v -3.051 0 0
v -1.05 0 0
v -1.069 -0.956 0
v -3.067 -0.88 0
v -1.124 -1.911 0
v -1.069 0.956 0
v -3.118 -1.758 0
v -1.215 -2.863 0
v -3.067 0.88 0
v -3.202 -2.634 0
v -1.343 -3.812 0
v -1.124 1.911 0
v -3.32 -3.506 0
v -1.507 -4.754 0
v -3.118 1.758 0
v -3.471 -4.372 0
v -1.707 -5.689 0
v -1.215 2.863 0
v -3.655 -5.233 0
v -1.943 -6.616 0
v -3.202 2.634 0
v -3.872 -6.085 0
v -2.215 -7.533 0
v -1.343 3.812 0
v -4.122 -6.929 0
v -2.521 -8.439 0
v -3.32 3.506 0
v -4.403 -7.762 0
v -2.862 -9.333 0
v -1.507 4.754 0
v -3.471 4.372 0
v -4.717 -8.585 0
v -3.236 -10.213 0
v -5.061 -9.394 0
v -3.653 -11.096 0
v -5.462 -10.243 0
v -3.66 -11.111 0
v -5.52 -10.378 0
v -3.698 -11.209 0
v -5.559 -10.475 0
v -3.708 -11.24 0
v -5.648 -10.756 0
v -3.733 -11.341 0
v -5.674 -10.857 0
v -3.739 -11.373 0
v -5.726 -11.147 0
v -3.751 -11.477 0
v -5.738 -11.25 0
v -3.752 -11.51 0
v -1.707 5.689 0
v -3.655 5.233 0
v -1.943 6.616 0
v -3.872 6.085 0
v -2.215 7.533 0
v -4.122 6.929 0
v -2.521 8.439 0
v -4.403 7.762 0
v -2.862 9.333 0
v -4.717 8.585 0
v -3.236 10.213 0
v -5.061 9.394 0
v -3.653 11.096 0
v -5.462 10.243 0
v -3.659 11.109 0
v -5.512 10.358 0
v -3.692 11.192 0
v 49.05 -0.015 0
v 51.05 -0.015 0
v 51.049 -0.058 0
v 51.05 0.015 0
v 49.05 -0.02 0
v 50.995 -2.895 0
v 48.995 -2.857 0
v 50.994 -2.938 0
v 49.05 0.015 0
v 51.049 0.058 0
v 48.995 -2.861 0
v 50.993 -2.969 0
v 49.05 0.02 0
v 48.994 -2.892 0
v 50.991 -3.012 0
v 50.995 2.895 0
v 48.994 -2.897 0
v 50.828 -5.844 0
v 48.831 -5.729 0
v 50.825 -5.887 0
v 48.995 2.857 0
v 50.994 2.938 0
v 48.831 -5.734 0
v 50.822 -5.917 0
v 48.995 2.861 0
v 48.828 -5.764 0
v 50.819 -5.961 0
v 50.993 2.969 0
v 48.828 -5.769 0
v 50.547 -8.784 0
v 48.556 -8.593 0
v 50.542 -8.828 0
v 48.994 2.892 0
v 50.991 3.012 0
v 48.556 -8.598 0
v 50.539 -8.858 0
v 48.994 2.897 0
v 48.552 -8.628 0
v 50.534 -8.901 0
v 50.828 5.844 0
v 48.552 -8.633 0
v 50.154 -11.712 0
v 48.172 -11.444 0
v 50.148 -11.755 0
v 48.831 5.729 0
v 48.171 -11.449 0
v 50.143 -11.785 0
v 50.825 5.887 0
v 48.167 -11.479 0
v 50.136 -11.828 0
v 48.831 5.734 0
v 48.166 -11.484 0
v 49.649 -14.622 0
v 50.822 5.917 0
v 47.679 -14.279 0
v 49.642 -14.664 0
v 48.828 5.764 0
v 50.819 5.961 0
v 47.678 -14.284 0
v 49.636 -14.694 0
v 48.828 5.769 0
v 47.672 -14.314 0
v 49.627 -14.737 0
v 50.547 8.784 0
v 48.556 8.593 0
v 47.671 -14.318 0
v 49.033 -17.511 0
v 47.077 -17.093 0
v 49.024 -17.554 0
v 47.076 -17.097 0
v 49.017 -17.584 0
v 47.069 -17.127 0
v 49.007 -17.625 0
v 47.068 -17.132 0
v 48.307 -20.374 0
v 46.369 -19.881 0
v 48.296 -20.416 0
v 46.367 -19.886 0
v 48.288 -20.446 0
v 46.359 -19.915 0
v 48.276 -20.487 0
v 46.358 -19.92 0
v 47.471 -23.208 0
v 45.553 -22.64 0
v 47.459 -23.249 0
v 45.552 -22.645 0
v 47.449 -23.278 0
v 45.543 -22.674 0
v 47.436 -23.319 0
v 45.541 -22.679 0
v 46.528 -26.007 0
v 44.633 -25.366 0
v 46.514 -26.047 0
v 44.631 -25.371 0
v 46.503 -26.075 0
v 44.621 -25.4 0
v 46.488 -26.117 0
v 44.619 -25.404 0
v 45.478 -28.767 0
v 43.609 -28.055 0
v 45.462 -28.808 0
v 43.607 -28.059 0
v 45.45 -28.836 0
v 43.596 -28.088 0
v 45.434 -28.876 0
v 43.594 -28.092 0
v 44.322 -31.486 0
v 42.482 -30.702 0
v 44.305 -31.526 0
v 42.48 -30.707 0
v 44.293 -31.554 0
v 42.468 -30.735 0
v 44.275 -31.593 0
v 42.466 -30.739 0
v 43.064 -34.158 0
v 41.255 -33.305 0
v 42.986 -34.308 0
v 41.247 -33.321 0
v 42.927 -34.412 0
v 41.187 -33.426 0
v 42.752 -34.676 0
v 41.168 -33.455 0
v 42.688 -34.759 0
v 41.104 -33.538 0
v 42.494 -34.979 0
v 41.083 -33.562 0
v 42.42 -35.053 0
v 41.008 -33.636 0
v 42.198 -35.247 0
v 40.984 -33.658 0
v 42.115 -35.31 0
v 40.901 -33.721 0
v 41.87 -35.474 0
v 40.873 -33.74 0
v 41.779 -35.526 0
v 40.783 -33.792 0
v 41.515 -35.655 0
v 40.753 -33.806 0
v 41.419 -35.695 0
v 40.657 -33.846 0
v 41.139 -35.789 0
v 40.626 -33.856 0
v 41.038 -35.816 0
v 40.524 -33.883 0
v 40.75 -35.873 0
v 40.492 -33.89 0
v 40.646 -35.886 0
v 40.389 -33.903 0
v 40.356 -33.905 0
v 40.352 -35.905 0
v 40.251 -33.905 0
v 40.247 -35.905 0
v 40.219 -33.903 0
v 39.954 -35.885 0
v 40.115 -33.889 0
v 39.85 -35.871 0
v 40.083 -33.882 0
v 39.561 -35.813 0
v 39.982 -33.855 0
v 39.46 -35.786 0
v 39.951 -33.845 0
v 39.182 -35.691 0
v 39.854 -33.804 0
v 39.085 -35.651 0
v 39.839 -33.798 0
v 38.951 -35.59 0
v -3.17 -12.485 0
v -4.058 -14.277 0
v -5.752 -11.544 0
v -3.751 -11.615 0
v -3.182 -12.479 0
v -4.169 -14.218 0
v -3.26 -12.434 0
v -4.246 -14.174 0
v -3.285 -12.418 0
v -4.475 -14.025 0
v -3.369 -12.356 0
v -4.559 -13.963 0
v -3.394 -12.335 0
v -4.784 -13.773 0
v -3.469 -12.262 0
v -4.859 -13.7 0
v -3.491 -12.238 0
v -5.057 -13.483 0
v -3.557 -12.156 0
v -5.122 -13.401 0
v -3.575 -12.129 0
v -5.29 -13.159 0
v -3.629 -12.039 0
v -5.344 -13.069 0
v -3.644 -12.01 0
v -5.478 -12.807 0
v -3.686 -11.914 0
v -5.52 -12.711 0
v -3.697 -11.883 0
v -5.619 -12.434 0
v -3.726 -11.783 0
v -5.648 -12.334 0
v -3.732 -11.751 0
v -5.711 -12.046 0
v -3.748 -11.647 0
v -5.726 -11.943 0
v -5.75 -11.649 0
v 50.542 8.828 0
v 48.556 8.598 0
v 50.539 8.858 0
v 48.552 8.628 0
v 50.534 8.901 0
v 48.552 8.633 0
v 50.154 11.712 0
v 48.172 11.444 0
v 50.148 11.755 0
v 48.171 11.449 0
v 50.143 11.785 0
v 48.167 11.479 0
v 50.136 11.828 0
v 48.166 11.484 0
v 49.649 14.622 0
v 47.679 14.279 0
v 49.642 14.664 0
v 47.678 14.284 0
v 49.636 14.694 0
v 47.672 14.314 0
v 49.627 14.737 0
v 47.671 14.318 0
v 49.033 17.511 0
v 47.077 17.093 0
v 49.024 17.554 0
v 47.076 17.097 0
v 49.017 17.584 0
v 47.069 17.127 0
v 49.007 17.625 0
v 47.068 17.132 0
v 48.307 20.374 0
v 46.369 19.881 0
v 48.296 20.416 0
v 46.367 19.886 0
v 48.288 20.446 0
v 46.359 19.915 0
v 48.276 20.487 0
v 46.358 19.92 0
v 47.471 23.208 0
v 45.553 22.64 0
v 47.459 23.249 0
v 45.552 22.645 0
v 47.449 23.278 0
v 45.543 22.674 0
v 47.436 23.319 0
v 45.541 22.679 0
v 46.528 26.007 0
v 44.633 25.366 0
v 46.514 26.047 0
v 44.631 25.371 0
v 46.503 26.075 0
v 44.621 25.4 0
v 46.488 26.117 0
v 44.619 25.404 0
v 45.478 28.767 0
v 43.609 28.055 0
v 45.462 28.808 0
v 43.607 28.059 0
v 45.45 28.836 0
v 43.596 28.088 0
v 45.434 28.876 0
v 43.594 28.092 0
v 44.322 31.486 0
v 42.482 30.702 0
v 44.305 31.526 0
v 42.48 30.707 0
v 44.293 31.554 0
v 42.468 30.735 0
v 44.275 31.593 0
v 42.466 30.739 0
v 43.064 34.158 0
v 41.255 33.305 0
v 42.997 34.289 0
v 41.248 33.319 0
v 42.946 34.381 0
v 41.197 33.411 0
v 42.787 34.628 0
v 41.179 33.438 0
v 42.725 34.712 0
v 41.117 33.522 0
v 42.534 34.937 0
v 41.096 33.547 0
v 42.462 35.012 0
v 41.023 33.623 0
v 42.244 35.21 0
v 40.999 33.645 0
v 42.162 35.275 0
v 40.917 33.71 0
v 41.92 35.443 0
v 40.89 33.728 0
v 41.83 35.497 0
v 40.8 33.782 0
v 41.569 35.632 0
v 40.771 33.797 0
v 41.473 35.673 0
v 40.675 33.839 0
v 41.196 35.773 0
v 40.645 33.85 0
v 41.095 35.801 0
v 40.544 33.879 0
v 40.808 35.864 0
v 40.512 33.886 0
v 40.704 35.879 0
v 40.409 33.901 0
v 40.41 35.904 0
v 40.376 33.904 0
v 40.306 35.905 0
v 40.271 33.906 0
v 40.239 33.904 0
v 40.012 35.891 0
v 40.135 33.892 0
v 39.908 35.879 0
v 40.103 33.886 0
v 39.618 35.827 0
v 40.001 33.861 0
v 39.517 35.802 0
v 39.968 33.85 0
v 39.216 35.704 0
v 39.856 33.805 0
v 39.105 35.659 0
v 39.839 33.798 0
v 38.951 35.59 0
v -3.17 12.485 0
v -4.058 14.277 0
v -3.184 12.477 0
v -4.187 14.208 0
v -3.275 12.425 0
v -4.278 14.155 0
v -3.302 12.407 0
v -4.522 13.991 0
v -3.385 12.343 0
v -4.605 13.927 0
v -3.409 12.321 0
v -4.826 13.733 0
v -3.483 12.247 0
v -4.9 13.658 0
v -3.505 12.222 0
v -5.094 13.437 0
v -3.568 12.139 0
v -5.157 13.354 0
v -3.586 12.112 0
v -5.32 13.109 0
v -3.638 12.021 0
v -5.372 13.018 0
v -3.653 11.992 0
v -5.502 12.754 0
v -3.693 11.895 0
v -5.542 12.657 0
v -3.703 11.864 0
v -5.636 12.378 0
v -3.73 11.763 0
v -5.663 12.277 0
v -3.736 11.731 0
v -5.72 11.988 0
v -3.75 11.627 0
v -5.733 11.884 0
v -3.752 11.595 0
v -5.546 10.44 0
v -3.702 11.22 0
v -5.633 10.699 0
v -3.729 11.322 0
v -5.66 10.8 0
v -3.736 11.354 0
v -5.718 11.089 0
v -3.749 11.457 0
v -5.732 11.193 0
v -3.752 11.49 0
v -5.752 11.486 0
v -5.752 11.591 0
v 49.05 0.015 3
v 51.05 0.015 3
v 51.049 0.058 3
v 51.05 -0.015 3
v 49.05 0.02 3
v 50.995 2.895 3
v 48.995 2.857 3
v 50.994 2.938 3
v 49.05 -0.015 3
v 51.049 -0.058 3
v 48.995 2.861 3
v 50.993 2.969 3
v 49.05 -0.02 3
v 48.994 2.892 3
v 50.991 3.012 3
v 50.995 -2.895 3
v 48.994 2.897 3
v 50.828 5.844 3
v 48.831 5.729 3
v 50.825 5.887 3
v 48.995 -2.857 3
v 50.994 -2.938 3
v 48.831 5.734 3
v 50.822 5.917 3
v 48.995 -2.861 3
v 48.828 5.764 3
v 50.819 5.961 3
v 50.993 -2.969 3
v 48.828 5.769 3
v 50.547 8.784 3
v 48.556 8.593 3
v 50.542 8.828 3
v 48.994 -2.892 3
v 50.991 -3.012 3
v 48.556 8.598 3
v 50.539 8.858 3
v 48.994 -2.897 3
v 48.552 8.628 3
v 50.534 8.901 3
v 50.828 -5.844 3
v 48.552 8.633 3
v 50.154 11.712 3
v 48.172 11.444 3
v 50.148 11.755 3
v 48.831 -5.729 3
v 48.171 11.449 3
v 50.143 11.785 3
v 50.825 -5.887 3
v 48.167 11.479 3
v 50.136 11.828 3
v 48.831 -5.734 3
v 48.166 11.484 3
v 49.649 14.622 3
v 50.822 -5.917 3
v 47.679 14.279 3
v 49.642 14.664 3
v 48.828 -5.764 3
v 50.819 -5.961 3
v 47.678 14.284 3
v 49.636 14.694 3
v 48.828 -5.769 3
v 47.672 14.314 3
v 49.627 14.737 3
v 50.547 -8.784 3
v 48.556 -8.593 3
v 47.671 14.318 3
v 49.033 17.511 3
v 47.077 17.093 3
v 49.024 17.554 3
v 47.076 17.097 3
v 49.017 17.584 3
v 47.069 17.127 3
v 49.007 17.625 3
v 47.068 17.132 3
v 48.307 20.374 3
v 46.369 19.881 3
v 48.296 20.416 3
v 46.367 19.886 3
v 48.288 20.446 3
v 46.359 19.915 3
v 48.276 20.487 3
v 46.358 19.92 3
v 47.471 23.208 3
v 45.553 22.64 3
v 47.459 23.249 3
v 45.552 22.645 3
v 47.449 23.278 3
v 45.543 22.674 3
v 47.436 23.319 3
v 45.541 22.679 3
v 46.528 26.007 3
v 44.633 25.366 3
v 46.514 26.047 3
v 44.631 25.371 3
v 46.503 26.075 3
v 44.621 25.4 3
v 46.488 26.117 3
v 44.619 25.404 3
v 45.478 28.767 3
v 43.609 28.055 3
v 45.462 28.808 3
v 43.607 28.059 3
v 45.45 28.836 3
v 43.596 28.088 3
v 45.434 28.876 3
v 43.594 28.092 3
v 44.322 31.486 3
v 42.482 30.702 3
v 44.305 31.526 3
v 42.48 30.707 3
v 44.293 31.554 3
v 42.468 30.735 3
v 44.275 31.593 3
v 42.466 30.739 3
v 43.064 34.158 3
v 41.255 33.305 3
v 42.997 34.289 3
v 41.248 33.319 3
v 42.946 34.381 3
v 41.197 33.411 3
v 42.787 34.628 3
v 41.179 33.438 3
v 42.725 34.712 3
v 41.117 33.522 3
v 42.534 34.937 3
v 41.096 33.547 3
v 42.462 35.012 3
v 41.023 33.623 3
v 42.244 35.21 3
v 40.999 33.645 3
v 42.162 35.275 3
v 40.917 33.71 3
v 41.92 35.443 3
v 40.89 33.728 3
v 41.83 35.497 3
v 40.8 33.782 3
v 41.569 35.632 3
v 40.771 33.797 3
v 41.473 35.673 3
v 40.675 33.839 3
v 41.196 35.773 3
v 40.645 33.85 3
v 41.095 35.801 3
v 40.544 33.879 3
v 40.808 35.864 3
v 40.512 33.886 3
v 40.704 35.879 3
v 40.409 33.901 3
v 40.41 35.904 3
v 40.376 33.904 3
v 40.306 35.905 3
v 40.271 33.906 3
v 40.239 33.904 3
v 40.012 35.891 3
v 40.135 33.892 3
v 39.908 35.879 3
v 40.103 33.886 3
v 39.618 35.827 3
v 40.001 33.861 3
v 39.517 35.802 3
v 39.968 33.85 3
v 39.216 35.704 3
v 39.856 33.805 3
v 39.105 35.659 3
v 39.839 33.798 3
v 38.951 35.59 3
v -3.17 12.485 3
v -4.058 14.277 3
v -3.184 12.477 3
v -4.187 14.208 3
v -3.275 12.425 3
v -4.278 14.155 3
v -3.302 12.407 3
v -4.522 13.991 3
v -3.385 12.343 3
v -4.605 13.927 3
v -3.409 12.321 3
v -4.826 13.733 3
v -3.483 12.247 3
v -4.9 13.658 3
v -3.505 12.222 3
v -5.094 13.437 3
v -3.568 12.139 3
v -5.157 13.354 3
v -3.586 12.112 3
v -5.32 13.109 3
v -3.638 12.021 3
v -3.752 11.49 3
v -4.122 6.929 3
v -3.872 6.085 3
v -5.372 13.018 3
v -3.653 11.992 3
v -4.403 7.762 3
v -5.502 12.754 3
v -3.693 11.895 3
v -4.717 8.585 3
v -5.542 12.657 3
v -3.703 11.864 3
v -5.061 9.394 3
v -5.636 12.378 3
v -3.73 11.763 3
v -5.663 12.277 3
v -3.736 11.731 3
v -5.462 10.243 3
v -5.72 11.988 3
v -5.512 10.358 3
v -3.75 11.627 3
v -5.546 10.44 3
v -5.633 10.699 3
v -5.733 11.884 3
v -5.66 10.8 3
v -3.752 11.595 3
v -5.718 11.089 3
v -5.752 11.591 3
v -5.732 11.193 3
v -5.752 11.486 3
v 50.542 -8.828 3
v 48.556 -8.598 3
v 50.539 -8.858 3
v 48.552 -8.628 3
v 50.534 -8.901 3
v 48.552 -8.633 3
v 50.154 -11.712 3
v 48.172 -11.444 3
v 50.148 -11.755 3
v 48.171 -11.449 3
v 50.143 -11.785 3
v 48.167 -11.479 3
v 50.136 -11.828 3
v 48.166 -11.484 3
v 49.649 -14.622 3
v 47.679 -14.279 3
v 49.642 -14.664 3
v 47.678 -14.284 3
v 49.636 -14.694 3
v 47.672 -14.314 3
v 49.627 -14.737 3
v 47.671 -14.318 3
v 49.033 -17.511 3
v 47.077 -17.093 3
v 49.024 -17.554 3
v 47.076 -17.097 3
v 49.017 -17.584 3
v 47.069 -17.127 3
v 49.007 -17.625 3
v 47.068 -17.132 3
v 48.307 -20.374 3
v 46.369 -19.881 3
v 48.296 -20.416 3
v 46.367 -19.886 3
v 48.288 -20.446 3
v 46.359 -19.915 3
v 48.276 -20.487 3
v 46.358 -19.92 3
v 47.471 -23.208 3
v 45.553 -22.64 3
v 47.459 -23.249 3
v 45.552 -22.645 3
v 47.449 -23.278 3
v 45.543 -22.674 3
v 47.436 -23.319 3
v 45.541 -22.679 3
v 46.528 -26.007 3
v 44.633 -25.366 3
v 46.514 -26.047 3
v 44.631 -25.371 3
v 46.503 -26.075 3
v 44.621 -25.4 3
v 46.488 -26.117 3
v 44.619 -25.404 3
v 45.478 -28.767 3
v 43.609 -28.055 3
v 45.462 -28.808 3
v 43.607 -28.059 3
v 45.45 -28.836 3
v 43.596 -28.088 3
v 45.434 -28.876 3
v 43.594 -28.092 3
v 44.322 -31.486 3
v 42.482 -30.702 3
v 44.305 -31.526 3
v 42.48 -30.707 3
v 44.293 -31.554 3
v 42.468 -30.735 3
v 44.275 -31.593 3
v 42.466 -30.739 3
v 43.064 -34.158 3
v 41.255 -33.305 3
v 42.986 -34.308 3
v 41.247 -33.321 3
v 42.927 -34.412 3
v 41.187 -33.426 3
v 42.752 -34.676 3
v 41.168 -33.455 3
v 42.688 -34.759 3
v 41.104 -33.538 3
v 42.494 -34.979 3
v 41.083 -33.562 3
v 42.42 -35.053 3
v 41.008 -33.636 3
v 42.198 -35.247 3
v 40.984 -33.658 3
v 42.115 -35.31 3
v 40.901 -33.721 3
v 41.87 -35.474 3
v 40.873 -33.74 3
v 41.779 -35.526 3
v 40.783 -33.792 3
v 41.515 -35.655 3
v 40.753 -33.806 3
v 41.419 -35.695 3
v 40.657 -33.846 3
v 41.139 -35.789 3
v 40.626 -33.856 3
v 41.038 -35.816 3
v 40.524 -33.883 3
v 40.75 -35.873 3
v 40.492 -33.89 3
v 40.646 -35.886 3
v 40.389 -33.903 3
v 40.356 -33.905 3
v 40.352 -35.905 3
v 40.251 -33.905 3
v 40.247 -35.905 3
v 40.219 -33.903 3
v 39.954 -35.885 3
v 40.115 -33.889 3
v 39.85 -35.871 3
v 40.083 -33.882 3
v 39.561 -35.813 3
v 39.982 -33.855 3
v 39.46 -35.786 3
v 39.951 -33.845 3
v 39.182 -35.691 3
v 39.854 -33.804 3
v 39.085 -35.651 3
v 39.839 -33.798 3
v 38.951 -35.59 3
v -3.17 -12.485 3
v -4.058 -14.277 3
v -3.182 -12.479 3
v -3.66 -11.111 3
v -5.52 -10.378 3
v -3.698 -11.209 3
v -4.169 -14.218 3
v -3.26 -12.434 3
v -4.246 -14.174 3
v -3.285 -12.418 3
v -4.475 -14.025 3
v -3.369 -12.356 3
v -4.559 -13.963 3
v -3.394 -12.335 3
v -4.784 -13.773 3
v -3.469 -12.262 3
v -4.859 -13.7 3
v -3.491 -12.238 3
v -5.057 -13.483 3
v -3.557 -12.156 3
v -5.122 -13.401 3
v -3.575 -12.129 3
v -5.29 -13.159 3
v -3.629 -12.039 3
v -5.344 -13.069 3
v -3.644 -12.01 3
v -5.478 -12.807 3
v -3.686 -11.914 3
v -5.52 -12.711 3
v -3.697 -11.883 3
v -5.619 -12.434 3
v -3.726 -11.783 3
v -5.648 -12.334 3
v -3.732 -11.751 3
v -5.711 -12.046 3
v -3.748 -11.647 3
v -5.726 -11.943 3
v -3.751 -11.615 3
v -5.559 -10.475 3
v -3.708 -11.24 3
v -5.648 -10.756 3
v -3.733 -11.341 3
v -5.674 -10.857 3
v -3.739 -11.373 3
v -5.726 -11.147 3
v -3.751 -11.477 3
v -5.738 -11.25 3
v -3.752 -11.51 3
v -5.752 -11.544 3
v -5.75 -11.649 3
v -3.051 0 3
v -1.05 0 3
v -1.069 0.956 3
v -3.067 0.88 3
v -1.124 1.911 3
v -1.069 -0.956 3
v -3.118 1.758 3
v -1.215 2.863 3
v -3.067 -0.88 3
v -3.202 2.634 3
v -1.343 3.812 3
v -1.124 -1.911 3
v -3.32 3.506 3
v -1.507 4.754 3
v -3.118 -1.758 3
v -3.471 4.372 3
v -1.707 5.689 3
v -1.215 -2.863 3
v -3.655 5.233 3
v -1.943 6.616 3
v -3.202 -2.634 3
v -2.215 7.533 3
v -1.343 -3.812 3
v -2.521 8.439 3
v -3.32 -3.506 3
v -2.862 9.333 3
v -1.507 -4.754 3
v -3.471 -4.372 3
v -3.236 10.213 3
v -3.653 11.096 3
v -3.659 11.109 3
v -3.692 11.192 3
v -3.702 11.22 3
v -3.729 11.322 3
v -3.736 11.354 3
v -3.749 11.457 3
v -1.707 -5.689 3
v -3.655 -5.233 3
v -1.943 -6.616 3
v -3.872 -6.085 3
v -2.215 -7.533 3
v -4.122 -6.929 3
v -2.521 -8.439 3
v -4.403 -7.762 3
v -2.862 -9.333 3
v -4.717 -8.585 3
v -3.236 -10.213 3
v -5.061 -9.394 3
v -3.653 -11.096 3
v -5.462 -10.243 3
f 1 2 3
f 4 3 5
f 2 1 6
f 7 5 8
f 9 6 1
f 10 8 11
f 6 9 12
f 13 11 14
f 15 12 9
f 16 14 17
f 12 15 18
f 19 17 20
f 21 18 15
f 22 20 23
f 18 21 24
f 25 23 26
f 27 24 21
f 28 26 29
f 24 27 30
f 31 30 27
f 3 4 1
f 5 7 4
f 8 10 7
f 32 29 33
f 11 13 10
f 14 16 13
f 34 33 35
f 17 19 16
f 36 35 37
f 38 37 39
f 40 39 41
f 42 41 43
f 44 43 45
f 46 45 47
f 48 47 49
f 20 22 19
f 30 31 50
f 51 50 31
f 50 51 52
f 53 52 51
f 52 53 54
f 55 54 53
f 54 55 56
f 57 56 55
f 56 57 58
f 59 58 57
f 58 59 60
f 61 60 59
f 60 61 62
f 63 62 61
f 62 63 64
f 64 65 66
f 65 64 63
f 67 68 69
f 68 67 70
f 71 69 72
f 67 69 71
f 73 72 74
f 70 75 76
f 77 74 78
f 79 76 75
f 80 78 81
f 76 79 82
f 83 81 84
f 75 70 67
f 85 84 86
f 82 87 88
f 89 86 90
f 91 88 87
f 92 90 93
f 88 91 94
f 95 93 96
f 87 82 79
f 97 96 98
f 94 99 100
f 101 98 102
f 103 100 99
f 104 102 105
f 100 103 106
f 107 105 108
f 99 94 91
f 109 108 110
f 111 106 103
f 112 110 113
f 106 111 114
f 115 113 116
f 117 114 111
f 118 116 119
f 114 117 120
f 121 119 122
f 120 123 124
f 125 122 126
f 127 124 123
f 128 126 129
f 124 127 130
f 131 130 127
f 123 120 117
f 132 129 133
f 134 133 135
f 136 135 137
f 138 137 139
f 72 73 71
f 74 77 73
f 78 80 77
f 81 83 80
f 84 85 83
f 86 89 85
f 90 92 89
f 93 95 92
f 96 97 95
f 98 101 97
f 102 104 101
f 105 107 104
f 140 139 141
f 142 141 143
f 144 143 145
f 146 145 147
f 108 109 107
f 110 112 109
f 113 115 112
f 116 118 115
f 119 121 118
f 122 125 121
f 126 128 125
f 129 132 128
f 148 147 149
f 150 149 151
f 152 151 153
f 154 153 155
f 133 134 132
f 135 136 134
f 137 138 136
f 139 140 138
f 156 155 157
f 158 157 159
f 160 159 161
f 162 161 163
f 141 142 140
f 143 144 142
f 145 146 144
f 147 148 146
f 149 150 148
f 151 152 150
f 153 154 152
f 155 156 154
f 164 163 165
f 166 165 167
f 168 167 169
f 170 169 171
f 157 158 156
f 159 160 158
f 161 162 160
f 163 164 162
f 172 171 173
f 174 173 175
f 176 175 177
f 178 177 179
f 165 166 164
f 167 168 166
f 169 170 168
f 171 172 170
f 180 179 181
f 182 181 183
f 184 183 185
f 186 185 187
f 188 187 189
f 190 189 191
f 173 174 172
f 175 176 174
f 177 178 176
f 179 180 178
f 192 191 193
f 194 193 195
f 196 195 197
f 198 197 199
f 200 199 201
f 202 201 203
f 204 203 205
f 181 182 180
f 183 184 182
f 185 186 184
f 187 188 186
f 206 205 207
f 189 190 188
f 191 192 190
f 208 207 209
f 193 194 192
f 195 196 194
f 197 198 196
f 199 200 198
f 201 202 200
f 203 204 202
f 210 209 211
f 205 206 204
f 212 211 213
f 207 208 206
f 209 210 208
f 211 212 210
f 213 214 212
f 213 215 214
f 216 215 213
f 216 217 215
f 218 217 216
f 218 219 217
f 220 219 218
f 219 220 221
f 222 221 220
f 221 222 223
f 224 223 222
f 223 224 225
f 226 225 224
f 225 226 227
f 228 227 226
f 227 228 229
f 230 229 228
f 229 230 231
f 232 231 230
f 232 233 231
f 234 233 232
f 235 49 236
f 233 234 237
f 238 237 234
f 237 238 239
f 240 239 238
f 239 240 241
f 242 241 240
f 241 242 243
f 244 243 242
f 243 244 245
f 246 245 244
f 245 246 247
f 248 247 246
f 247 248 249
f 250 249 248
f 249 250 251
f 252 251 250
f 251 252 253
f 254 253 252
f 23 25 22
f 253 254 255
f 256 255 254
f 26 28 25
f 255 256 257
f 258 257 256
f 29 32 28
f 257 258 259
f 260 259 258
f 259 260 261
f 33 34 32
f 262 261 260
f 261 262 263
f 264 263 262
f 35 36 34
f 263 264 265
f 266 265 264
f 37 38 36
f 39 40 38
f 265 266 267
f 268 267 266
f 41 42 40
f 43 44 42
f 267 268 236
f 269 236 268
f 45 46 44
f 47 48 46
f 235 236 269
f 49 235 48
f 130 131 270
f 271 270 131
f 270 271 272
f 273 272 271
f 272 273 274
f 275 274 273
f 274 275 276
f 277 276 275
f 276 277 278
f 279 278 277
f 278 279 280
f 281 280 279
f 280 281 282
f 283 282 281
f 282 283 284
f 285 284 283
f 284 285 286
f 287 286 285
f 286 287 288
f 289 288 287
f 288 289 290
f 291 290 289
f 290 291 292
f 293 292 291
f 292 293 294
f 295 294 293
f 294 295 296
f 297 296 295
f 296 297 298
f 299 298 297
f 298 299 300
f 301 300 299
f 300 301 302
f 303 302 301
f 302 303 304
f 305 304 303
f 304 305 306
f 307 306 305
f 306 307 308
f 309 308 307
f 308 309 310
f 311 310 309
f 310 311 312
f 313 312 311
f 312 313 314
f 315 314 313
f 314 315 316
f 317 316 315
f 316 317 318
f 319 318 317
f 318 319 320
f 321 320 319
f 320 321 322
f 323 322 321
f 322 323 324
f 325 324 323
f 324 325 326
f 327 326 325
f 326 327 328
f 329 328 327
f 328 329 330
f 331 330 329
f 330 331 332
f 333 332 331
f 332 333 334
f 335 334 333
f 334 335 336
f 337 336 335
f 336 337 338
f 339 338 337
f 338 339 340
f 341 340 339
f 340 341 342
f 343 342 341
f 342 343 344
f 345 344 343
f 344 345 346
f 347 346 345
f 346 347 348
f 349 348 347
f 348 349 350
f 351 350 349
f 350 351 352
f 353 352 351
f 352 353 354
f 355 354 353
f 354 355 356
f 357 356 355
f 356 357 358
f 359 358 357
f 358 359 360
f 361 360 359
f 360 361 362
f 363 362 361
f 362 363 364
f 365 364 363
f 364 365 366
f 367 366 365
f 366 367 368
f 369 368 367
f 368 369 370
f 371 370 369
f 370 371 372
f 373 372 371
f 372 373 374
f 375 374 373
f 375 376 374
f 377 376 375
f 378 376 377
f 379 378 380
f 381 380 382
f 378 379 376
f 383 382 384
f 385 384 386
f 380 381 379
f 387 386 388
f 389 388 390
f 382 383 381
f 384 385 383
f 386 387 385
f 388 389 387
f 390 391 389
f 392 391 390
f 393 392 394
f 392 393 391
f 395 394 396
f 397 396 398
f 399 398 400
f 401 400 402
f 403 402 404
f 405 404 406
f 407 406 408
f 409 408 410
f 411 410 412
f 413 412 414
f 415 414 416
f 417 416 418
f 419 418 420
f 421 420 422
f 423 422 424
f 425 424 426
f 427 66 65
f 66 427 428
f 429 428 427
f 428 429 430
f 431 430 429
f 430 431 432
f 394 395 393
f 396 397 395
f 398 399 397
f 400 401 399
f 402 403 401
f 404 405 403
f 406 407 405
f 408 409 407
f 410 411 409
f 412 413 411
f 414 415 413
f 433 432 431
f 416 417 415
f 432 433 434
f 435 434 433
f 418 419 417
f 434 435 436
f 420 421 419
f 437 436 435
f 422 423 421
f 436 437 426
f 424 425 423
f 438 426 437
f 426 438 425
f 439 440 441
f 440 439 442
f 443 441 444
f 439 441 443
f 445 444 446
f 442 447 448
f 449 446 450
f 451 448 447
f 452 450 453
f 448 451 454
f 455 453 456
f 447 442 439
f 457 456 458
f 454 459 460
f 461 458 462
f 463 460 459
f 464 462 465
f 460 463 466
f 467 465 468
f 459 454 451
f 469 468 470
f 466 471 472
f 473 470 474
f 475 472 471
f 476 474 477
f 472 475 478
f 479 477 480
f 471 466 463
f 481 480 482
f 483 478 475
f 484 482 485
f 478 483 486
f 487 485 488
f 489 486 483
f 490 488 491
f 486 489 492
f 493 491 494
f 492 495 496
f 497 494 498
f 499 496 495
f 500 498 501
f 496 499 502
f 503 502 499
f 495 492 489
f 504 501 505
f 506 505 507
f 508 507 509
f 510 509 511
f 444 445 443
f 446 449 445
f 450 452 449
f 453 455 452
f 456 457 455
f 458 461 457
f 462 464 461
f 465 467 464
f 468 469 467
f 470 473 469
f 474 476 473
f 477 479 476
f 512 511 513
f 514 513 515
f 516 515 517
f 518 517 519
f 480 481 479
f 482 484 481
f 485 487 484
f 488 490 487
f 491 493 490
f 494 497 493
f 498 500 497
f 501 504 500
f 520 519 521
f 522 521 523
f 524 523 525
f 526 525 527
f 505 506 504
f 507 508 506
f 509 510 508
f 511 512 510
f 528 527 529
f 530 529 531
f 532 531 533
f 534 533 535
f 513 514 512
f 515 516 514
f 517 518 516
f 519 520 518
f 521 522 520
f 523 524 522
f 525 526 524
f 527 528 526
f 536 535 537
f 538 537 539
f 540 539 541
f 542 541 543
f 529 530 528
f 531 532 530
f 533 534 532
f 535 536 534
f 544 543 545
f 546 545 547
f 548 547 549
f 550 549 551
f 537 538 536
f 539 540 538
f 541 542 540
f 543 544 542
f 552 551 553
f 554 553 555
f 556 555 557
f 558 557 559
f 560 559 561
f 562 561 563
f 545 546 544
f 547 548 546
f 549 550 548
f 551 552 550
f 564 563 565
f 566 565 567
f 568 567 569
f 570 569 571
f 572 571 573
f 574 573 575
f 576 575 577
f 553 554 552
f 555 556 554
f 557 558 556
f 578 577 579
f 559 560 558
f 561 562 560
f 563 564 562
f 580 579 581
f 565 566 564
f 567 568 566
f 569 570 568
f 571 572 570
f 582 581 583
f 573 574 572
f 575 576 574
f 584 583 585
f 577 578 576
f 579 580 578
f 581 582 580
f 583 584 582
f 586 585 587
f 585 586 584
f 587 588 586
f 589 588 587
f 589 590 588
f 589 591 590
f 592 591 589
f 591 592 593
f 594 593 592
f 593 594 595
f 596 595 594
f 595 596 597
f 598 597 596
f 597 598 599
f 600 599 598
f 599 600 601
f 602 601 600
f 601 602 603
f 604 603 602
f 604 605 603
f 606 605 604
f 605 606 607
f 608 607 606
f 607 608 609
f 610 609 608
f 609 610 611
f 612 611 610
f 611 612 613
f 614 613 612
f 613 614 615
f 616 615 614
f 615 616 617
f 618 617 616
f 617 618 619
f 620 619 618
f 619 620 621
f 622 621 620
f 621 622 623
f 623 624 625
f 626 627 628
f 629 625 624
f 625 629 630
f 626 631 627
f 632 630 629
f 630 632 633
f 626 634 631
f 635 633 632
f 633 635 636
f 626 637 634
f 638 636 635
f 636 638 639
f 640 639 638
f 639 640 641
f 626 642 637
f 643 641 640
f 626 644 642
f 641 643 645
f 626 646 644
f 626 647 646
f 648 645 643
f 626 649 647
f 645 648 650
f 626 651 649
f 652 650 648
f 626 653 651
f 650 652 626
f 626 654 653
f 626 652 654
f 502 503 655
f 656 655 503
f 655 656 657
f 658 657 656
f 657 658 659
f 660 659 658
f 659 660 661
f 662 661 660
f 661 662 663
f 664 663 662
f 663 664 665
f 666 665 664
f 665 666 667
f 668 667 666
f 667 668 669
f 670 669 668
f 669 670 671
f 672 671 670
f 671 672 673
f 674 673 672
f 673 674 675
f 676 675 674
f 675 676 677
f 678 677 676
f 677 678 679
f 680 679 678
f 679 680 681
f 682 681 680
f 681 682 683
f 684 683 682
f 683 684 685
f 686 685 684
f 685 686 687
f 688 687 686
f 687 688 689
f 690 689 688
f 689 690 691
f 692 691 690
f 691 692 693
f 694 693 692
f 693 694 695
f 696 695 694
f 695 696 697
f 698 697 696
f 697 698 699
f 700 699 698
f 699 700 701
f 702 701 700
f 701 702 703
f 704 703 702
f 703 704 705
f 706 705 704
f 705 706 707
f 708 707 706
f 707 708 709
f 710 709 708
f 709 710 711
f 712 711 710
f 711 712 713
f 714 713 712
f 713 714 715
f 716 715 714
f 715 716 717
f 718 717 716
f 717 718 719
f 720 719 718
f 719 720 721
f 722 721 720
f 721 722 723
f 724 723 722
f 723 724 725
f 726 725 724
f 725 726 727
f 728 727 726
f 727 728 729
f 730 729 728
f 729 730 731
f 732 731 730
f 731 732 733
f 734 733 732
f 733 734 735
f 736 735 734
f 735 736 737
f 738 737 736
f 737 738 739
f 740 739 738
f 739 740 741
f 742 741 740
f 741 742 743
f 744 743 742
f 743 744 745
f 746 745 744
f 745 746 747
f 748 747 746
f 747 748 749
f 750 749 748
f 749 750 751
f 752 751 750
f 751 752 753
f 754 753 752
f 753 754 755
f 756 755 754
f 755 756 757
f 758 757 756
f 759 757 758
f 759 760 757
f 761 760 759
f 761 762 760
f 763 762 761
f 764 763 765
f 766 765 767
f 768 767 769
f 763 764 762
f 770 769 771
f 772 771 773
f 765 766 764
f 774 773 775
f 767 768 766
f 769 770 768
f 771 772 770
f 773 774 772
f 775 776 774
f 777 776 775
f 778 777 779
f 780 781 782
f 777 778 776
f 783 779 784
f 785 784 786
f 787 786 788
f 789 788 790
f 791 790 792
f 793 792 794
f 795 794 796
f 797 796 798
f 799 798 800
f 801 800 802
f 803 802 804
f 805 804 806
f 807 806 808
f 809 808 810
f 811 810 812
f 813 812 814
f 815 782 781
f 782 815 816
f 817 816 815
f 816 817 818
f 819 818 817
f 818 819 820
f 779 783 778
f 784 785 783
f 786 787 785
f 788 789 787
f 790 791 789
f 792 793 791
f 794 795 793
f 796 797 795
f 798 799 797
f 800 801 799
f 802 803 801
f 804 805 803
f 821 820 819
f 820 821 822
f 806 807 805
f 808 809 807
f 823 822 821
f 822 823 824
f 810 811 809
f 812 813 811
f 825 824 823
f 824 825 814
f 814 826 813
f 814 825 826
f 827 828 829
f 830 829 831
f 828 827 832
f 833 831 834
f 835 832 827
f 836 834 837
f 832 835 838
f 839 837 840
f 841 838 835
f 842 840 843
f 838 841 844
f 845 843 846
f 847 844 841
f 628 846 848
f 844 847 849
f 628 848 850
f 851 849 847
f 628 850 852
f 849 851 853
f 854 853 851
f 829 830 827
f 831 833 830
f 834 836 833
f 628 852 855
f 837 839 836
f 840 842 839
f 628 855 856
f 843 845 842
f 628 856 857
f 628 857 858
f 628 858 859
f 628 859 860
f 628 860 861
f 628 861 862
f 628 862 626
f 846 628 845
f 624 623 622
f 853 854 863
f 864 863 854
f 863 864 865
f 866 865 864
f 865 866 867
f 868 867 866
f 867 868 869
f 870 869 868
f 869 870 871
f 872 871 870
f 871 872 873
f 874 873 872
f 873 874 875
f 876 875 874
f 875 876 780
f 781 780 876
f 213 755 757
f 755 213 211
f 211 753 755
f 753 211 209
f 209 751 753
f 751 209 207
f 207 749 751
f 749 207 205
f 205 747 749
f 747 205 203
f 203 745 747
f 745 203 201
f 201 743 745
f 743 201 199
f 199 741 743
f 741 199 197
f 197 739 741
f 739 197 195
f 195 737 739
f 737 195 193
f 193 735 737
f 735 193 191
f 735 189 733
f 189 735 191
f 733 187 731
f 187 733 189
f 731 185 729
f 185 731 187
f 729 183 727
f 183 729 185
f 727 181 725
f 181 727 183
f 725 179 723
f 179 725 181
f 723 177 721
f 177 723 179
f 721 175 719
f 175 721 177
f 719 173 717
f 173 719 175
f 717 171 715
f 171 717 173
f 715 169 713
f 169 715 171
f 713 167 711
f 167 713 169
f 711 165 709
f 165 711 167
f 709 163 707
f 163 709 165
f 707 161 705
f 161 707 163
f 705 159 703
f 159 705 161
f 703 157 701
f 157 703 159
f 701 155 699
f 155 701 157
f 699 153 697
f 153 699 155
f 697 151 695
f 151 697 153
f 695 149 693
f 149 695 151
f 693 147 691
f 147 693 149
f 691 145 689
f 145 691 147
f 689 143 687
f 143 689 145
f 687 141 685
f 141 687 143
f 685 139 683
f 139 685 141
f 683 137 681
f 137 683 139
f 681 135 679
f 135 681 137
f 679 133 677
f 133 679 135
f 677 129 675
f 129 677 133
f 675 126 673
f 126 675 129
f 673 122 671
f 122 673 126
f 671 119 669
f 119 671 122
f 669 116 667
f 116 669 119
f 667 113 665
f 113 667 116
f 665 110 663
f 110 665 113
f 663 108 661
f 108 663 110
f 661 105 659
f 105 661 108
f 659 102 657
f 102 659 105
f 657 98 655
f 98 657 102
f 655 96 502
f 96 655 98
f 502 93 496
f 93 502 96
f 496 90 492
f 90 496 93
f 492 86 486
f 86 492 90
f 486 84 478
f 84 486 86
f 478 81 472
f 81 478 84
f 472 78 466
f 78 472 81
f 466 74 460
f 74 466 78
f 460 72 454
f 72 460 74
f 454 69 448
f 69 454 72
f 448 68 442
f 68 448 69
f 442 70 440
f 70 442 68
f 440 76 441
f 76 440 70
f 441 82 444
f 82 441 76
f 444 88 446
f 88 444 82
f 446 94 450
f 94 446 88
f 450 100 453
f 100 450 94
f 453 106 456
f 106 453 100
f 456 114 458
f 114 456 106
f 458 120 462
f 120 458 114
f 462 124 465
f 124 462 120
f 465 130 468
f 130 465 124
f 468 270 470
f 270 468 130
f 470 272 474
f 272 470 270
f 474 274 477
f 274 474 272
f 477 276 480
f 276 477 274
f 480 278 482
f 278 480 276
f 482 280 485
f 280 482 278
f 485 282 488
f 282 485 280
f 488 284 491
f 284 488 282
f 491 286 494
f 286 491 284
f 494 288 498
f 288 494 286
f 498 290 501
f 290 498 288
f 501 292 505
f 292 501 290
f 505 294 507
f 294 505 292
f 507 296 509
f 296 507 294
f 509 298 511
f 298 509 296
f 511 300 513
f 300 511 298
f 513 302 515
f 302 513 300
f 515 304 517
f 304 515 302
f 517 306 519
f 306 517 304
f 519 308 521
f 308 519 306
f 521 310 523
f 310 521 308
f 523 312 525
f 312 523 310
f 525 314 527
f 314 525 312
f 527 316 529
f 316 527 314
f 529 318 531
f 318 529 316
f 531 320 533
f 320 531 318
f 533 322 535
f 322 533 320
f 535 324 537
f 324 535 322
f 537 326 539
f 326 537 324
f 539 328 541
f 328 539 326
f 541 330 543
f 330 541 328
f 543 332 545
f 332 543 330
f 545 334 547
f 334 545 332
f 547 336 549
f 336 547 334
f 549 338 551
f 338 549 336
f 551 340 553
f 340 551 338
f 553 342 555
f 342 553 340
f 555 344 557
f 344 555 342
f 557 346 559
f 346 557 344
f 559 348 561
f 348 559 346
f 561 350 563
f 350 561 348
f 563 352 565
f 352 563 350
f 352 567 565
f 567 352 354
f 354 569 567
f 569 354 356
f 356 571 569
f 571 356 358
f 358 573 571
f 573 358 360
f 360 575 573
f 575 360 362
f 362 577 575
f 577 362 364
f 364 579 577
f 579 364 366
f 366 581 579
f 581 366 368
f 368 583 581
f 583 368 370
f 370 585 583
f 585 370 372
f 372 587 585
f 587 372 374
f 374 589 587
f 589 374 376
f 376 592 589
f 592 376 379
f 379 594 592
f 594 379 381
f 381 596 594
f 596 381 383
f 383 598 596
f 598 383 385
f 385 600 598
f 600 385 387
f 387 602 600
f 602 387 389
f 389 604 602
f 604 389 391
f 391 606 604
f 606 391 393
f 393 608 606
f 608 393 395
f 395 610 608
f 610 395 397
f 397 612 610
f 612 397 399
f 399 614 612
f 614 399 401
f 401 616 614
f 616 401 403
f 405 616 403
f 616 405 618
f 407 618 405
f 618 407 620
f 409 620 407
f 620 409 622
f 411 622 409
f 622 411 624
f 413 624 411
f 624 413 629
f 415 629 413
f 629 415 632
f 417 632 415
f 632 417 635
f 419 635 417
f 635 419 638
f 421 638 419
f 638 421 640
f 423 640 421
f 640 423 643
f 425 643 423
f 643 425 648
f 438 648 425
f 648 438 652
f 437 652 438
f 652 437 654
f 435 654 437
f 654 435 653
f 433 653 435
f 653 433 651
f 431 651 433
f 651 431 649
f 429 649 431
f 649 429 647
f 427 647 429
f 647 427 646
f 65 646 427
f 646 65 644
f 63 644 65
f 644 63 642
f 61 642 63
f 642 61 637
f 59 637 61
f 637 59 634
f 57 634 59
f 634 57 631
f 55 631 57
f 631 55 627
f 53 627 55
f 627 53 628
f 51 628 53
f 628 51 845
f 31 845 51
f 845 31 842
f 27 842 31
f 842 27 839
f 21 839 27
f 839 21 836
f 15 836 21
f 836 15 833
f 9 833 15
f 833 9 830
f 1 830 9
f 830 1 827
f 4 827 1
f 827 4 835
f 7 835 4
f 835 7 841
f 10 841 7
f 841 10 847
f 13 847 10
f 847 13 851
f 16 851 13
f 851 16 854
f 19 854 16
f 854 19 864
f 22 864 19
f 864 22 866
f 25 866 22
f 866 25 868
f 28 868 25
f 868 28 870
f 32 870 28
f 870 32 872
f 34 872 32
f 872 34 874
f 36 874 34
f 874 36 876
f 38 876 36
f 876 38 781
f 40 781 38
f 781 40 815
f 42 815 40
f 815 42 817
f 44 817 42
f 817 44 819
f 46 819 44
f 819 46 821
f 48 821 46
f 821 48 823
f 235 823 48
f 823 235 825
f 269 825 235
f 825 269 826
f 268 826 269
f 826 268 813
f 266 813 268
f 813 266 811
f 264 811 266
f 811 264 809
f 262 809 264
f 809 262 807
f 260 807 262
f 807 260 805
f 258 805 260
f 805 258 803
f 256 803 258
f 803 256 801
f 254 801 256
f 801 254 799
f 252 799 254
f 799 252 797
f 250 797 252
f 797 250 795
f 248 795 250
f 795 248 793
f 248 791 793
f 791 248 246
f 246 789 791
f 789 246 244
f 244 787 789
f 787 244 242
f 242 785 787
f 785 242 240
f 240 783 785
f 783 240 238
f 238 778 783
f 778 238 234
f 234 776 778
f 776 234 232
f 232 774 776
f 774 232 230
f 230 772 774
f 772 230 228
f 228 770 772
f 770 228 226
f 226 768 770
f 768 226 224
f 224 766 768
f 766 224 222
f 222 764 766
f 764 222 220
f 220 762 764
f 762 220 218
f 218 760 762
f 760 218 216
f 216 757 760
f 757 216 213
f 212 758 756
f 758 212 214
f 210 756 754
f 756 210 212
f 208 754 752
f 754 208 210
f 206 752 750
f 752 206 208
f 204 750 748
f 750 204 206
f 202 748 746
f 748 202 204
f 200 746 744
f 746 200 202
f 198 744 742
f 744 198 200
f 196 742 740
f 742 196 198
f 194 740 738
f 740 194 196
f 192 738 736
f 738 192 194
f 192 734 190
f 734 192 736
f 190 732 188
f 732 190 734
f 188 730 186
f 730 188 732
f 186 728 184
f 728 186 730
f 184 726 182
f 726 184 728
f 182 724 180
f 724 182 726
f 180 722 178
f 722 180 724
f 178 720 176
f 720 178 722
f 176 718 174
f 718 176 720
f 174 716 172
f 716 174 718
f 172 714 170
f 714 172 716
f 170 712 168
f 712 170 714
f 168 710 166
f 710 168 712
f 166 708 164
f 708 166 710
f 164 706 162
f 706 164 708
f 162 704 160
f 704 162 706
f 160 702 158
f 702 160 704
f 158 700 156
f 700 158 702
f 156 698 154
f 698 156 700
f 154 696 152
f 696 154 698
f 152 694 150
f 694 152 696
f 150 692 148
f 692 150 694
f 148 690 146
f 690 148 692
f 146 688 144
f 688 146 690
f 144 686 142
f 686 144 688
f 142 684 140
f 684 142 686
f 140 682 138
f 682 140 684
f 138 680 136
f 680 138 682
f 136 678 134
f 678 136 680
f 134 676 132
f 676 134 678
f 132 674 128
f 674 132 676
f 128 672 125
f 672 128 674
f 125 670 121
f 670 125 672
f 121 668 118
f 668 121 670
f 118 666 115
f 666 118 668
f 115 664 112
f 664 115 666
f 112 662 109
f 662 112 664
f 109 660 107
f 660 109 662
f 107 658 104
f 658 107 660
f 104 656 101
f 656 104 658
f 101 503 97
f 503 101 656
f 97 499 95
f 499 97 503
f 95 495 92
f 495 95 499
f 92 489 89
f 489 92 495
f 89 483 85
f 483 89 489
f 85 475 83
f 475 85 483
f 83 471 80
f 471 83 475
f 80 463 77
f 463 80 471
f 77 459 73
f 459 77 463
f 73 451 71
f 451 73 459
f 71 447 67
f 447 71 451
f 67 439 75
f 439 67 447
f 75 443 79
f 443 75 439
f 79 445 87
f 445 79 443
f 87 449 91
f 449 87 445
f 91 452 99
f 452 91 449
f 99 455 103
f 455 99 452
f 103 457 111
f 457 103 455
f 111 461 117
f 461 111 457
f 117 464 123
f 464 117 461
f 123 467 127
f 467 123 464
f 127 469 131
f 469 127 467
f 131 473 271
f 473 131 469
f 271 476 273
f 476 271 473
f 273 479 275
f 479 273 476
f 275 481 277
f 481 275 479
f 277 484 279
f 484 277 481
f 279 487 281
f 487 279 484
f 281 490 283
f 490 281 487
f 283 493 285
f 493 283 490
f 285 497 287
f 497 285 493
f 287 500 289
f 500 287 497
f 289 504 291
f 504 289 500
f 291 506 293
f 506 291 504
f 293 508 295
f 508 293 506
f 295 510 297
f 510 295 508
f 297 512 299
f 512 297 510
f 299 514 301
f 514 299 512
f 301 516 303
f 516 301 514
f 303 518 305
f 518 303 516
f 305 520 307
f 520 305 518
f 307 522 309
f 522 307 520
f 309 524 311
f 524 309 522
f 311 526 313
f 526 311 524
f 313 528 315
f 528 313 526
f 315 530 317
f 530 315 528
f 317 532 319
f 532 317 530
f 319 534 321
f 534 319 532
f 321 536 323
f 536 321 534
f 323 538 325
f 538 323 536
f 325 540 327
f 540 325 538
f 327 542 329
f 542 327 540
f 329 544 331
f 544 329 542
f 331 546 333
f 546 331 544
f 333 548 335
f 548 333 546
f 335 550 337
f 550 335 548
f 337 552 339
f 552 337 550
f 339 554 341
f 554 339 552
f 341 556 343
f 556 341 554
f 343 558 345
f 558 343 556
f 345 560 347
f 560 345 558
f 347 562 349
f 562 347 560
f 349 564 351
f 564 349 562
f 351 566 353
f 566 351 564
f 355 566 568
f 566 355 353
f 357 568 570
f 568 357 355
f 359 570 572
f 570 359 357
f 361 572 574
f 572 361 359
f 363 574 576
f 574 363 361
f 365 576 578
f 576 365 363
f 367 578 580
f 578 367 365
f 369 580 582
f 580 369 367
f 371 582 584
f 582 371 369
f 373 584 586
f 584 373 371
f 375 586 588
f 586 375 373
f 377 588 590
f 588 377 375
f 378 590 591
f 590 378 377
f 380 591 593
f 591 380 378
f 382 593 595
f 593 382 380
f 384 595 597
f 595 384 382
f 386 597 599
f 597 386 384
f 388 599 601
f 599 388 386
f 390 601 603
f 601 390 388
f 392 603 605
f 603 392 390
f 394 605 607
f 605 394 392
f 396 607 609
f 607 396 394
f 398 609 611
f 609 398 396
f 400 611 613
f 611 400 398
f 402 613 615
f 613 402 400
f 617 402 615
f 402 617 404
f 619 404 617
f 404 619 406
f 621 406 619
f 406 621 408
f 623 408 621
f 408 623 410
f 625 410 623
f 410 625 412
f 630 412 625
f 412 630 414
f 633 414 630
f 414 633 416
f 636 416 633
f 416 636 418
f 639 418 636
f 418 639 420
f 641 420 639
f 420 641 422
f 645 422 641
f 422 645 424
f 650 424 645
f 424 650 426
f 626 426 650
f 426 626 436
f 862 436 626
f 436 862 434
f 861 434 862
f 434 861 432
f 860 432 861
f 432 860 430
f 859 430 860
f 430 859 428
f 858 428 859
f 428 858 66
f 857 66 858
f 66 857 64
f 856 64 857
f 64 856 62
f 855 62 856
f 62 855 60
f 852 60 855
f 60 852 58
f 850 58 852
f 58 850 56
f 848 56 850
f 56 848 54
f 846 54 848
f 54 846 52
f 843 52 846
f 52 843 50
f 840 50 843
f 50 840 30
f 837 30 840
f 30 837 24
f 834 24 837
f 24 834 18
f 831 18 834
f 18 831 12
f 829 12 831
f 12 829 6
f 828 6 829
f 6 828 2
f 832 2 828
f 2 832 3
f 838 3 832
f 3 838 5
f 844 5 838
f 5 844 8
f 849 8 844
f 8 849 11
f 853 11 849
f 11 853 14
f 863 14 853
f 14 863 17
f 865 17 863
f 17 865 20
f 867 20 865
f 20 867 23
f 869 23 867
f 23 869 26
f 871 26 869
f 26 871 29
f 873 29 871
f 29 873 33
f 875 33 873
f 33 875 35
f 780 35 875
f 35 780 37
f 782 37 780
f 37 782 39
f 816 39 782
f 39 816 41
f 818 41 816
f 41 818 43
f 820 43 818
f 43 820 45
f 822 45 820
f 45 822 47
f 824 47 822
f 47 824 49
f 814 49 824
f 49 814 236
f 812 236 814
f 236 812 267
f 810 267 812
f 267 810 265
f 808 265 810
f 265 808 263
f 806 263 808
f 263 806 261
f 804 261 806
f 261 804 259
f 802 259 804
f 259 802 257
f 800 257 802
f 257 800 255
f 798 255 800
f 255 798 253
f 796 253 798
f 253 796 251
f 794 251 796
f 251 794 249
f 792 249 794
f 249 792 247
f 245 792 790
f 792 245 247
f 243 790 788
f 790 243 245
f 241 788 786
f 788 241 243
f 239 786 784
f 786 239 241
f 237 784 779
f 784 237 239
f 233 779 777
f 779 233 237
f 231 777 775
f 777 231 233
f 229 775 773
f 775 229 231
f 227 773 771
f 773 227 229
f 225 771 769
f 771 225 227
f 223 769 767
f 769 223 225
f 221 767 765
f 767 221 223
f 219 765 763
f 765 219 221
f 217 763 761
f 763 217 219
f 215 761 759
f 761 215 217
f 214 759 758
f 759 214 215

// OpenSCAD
// file: parameters.scad
// =============================================================================
// Gen-BW — nightly 2026-10-10 (physics_scorer, honest magpylib watts)
// Stacked poles: two Ø20×5 per pocket (10 mm poles), 4 per rotor at R52, trading pole count for field — peak Bz at the copper rises to ≈0.73 T (vs 0.54 T on Gen-BR), which lets a thin 6.75 mm copper layer with a very deep 21 mm build carry the turns. But the electrical frequency halves, and the scorer puts it at about 45 % of Gen-BR: the thicker magnets do not make up for half the poles.
// Clocking 0 deg (magnets N facing S) + D-flat keyed bore + index notch + flip-symmetric hole map.
// Windable 2-piece bobbin; turns = physics_scorer turns_fit; copper only between flanges.
// Steel back-iron: 2× Ø134 × 6.35 mm (1/4") mild-steel discs (steel_backiron_disc.dxf); magnets sit ON the steel
// (through-pockets) -> score with --back-iron. Night 2026-10-10.
// =============================================================================
topology            = "dual_rotor";

// --- Wire / winding (physics_scorer winding-fit) -------------------------------
wire_awg            = 26;
wire_od             = 0.45;     // insulated OD mm (bare 0.405)
fill_realistic      = 0.65;     // insulated-wire area / window (DENSE layered wind with a jig; scorer cap 0.65)
turns               = 586;       // = physics_scorer turns_fit (do NOT raise)
coil_former_type    = "bobbin";
coil_core_inset     = 21.25;     // radial copper build: hub = copper boundary inset by this
wind_build_axial    = 0.0;      // nothing proud of the flanges
wind_build_radial   = 0.0;

// --- Bobbin (base + lid) ---------------------------------------------------------
coil_id_r           = 26.00;    // copper boundary sector
coil_od_r           = 74.00;
span_deg            = 52.72;    // = pitch - 2*asin((wall+0.85)/coil_id_r) -> >=1.2 mm stator web
former_web          = 6.75;     // copper height between flanges (TALL copper: steel keeps Bz up)
flange_t            = 0.80;     // >= 0.8 mm FDM wall rule (tall winds push on the flanges)
wall                = 0.80;     // flange lip beyond copper
former_bare_h       = former_web + 2 * flange_t;
coil_envelope_h     = former_bare_h + 2 * wind_build_axial;
tab_w               = 7.0;
tab_len             = 7.0;
tab_h               = former_bare_h / 2;
pin_d               = 1.9;      // 1.75 mm filament locating pin
coil_mount_r        = coil_od_r + 0.2 + 4.0;
lead_y              = 1.6;
lead_slot_w         = 0.9;
lead_groove_d       = 0.6;

// --- Gap -------------------------------------------------------------------------
run_clear           = 0.50;     // rotor face -> flange
gap_spacer_h        = run_clear + wind_build_axial;
m2m                 = coil_envelope_h + 2 * run_clear;   // rotor face to rotor face (= gap_sleeve length)

// --- Stator ----------------------------------------------------------------------
coil_stations       = 6;
bay_clear           = 0.25;
stator_thick        = former_bare_h;                        // bobbins flush both faces
stator_od           = 166;
shaft_clear_stator  = 14.0;     // stator is static; gap sleeve OD 12 spins inside

// --- Rotor(s) --------------------------------------------------------------------
magnet_Br           = 1.43;     // N52
magnet_d_large      = 20.0;
magnet_h_large      = 10.0;      // two O20x5 stacked per pocket
magnet_h_small      = 5.0;      // unused: no O5 pockets in this kit
halbach_magnetisation = "none";  // NO O5 assist magnets in this kit (scan: they lower the 4-pole score)
rotor_b_same_axis   = true;     // same-index magnets share one axis: N faces S across the gap
large_pocket_d      = 20.3;
small_pocket_d      = 5.3;
pocket_h            = 10.00;     // THROUGH the carrier: magnet back face sits on the steel disc (FLUSH seat: carrier = magnet height, magnet face level with the rotor face)
large_n             = 4;
R_large             = 52.0;
small_r_list        = [];       // no O5 pockets
carrier_od          = 134.0;
carrier_thick       = pocket_h;
hub_h               = 14.0;     // > steel_t + insert: radial set-screw clears the steel
hub_od              = 24.0;     // slim hub so the M4 brace rods fit at R~18 inside the coil ring
hub_insert_d        = 4.0;      // M3 heat-set insert, radial, bears on the D-flat
rotor_b_offset_deg  = 0.0;      // CLOCKING: magnets directly opposite
shaft_key           = "dflat";
dflat_depth         = 0.5;      // 8 mm shaft with 0.5 mm flat (7.5 across flat)
index_notch_d       = 3.0;

// --- Steel back-iron (buyable laser-cut) -------------------------------------------
steel_t             = 6.35;      // mild steel thickness (image method ignores it; sized from steel_flux.py so the return path stays well below saturation)
steel_center_hole   = 26.0;     // slips over the rotor hub (OD 24)
steel_od            = carrier_od;   // steel disc OD = rotor carrier OD

// --- Modular MAX interface ----------------------------------------------------------
shaft_bore          = 8.35;
dflat_x             = 4.0 - dflat_depth + (shaft_bore - 8.0) / 2;
bearing_d           = 21.85;
bearing_h           = 7.2;
m3_clear            = 3.5;
bolt_r_inner        = 30.0;     // M3 steel-disc clamp bolts (inside the magnet ring)
bolt_n_inner        = 4;
bolt_inner_angles   = [0, 90, 180, 270];
bolt_r_outer        = 63.0;     // second M3 steel-disc clamp ring
bolt_outer_angles   = [45, 135, 225, 315];
flange_bolt_r       = 73.0;     // frame rods: OUTSIDE the rotor OD (rotors spin inside them)
flange_bolt_n       = 6;
flange_bolt_offset  = 30.00;    // between coil stations -> never cuts a lead groove/tab
brace_r             = 18.0;
brace_d             = 4.3;      // temporary M4 jack rods (assembly only)
brace_n             = 4;
brace_angles        = [45, 135, 225, 315];          // flip-symmetric

spacer_pad_od       = 14.0;
spacer_pad_id       = m3_clear;
endbell_od          = 156.0;
endbell_thick       = 8.0;
endbell_shaft_clear = 10.0;
collar_h            = 10.0;
standoff_od         = 9.0;
frame_standoff_h    = run_clear + carrier_thick + hub_h + collar_h + 2.0;
sleeve_od           = 12.0;
plate_max_mm        = 410;

$fn = 64;
// main file
// Gen-BW — fit coupon (bay part): O20/O5 THROUGH pockets at carrier thickness (test on a steel offcut), 608 seat,
// D-flat bore, gap shim, and one bobbin-bay slice (bobbin footprint + bay_clear) to test former fit.
include <parameters.scad>;
$fn = 48;
// D-flat keyed bore: flat faces +X (angle 0 = magnet pocket 0 = index notch)
module dflat_bore(h) {
    intersection() {
        cylinder(d=shaft_bore, h=h);
        translate([-shaft_bore, -shaft_bore, 0]) cube([shaft_bore + dflat_x, 2*shaft_bore, h]);
    }
}
module sector_2d(r_in, r_out, ang) {
    polygon([
        for (a = [-ang/2 : ang/24 : ang/2]) [r_in*cos(a), r_in*sin(a)],
        for (a = [ang/2 : -ang/24 : -ang/2]) [r_out*cos(a), r_out*sin(a)]
    ]);
}
module footprint_2d() { offset(r=wall) sector_2d(coil_id_r, coil_od_r, span_deg); }
module hub_2d()       { offset(delta=-coil_core_inset) sector_2d(coil_id_r, coil_od_r, span_deg); }

// bay slice: 3 mm tall ring section of the stator bay around one footprint (tests bobbin drop-in fit)
translate([-coil_id_r, 0, 0]) difference() {
    linear_extrude(3) offset(r=bay_clear + 2) footprint_2d();
    translate([0, 0, -0.1]) linear_extrude(3.2) offset(r=bay_clear) footprint_2d();
}
